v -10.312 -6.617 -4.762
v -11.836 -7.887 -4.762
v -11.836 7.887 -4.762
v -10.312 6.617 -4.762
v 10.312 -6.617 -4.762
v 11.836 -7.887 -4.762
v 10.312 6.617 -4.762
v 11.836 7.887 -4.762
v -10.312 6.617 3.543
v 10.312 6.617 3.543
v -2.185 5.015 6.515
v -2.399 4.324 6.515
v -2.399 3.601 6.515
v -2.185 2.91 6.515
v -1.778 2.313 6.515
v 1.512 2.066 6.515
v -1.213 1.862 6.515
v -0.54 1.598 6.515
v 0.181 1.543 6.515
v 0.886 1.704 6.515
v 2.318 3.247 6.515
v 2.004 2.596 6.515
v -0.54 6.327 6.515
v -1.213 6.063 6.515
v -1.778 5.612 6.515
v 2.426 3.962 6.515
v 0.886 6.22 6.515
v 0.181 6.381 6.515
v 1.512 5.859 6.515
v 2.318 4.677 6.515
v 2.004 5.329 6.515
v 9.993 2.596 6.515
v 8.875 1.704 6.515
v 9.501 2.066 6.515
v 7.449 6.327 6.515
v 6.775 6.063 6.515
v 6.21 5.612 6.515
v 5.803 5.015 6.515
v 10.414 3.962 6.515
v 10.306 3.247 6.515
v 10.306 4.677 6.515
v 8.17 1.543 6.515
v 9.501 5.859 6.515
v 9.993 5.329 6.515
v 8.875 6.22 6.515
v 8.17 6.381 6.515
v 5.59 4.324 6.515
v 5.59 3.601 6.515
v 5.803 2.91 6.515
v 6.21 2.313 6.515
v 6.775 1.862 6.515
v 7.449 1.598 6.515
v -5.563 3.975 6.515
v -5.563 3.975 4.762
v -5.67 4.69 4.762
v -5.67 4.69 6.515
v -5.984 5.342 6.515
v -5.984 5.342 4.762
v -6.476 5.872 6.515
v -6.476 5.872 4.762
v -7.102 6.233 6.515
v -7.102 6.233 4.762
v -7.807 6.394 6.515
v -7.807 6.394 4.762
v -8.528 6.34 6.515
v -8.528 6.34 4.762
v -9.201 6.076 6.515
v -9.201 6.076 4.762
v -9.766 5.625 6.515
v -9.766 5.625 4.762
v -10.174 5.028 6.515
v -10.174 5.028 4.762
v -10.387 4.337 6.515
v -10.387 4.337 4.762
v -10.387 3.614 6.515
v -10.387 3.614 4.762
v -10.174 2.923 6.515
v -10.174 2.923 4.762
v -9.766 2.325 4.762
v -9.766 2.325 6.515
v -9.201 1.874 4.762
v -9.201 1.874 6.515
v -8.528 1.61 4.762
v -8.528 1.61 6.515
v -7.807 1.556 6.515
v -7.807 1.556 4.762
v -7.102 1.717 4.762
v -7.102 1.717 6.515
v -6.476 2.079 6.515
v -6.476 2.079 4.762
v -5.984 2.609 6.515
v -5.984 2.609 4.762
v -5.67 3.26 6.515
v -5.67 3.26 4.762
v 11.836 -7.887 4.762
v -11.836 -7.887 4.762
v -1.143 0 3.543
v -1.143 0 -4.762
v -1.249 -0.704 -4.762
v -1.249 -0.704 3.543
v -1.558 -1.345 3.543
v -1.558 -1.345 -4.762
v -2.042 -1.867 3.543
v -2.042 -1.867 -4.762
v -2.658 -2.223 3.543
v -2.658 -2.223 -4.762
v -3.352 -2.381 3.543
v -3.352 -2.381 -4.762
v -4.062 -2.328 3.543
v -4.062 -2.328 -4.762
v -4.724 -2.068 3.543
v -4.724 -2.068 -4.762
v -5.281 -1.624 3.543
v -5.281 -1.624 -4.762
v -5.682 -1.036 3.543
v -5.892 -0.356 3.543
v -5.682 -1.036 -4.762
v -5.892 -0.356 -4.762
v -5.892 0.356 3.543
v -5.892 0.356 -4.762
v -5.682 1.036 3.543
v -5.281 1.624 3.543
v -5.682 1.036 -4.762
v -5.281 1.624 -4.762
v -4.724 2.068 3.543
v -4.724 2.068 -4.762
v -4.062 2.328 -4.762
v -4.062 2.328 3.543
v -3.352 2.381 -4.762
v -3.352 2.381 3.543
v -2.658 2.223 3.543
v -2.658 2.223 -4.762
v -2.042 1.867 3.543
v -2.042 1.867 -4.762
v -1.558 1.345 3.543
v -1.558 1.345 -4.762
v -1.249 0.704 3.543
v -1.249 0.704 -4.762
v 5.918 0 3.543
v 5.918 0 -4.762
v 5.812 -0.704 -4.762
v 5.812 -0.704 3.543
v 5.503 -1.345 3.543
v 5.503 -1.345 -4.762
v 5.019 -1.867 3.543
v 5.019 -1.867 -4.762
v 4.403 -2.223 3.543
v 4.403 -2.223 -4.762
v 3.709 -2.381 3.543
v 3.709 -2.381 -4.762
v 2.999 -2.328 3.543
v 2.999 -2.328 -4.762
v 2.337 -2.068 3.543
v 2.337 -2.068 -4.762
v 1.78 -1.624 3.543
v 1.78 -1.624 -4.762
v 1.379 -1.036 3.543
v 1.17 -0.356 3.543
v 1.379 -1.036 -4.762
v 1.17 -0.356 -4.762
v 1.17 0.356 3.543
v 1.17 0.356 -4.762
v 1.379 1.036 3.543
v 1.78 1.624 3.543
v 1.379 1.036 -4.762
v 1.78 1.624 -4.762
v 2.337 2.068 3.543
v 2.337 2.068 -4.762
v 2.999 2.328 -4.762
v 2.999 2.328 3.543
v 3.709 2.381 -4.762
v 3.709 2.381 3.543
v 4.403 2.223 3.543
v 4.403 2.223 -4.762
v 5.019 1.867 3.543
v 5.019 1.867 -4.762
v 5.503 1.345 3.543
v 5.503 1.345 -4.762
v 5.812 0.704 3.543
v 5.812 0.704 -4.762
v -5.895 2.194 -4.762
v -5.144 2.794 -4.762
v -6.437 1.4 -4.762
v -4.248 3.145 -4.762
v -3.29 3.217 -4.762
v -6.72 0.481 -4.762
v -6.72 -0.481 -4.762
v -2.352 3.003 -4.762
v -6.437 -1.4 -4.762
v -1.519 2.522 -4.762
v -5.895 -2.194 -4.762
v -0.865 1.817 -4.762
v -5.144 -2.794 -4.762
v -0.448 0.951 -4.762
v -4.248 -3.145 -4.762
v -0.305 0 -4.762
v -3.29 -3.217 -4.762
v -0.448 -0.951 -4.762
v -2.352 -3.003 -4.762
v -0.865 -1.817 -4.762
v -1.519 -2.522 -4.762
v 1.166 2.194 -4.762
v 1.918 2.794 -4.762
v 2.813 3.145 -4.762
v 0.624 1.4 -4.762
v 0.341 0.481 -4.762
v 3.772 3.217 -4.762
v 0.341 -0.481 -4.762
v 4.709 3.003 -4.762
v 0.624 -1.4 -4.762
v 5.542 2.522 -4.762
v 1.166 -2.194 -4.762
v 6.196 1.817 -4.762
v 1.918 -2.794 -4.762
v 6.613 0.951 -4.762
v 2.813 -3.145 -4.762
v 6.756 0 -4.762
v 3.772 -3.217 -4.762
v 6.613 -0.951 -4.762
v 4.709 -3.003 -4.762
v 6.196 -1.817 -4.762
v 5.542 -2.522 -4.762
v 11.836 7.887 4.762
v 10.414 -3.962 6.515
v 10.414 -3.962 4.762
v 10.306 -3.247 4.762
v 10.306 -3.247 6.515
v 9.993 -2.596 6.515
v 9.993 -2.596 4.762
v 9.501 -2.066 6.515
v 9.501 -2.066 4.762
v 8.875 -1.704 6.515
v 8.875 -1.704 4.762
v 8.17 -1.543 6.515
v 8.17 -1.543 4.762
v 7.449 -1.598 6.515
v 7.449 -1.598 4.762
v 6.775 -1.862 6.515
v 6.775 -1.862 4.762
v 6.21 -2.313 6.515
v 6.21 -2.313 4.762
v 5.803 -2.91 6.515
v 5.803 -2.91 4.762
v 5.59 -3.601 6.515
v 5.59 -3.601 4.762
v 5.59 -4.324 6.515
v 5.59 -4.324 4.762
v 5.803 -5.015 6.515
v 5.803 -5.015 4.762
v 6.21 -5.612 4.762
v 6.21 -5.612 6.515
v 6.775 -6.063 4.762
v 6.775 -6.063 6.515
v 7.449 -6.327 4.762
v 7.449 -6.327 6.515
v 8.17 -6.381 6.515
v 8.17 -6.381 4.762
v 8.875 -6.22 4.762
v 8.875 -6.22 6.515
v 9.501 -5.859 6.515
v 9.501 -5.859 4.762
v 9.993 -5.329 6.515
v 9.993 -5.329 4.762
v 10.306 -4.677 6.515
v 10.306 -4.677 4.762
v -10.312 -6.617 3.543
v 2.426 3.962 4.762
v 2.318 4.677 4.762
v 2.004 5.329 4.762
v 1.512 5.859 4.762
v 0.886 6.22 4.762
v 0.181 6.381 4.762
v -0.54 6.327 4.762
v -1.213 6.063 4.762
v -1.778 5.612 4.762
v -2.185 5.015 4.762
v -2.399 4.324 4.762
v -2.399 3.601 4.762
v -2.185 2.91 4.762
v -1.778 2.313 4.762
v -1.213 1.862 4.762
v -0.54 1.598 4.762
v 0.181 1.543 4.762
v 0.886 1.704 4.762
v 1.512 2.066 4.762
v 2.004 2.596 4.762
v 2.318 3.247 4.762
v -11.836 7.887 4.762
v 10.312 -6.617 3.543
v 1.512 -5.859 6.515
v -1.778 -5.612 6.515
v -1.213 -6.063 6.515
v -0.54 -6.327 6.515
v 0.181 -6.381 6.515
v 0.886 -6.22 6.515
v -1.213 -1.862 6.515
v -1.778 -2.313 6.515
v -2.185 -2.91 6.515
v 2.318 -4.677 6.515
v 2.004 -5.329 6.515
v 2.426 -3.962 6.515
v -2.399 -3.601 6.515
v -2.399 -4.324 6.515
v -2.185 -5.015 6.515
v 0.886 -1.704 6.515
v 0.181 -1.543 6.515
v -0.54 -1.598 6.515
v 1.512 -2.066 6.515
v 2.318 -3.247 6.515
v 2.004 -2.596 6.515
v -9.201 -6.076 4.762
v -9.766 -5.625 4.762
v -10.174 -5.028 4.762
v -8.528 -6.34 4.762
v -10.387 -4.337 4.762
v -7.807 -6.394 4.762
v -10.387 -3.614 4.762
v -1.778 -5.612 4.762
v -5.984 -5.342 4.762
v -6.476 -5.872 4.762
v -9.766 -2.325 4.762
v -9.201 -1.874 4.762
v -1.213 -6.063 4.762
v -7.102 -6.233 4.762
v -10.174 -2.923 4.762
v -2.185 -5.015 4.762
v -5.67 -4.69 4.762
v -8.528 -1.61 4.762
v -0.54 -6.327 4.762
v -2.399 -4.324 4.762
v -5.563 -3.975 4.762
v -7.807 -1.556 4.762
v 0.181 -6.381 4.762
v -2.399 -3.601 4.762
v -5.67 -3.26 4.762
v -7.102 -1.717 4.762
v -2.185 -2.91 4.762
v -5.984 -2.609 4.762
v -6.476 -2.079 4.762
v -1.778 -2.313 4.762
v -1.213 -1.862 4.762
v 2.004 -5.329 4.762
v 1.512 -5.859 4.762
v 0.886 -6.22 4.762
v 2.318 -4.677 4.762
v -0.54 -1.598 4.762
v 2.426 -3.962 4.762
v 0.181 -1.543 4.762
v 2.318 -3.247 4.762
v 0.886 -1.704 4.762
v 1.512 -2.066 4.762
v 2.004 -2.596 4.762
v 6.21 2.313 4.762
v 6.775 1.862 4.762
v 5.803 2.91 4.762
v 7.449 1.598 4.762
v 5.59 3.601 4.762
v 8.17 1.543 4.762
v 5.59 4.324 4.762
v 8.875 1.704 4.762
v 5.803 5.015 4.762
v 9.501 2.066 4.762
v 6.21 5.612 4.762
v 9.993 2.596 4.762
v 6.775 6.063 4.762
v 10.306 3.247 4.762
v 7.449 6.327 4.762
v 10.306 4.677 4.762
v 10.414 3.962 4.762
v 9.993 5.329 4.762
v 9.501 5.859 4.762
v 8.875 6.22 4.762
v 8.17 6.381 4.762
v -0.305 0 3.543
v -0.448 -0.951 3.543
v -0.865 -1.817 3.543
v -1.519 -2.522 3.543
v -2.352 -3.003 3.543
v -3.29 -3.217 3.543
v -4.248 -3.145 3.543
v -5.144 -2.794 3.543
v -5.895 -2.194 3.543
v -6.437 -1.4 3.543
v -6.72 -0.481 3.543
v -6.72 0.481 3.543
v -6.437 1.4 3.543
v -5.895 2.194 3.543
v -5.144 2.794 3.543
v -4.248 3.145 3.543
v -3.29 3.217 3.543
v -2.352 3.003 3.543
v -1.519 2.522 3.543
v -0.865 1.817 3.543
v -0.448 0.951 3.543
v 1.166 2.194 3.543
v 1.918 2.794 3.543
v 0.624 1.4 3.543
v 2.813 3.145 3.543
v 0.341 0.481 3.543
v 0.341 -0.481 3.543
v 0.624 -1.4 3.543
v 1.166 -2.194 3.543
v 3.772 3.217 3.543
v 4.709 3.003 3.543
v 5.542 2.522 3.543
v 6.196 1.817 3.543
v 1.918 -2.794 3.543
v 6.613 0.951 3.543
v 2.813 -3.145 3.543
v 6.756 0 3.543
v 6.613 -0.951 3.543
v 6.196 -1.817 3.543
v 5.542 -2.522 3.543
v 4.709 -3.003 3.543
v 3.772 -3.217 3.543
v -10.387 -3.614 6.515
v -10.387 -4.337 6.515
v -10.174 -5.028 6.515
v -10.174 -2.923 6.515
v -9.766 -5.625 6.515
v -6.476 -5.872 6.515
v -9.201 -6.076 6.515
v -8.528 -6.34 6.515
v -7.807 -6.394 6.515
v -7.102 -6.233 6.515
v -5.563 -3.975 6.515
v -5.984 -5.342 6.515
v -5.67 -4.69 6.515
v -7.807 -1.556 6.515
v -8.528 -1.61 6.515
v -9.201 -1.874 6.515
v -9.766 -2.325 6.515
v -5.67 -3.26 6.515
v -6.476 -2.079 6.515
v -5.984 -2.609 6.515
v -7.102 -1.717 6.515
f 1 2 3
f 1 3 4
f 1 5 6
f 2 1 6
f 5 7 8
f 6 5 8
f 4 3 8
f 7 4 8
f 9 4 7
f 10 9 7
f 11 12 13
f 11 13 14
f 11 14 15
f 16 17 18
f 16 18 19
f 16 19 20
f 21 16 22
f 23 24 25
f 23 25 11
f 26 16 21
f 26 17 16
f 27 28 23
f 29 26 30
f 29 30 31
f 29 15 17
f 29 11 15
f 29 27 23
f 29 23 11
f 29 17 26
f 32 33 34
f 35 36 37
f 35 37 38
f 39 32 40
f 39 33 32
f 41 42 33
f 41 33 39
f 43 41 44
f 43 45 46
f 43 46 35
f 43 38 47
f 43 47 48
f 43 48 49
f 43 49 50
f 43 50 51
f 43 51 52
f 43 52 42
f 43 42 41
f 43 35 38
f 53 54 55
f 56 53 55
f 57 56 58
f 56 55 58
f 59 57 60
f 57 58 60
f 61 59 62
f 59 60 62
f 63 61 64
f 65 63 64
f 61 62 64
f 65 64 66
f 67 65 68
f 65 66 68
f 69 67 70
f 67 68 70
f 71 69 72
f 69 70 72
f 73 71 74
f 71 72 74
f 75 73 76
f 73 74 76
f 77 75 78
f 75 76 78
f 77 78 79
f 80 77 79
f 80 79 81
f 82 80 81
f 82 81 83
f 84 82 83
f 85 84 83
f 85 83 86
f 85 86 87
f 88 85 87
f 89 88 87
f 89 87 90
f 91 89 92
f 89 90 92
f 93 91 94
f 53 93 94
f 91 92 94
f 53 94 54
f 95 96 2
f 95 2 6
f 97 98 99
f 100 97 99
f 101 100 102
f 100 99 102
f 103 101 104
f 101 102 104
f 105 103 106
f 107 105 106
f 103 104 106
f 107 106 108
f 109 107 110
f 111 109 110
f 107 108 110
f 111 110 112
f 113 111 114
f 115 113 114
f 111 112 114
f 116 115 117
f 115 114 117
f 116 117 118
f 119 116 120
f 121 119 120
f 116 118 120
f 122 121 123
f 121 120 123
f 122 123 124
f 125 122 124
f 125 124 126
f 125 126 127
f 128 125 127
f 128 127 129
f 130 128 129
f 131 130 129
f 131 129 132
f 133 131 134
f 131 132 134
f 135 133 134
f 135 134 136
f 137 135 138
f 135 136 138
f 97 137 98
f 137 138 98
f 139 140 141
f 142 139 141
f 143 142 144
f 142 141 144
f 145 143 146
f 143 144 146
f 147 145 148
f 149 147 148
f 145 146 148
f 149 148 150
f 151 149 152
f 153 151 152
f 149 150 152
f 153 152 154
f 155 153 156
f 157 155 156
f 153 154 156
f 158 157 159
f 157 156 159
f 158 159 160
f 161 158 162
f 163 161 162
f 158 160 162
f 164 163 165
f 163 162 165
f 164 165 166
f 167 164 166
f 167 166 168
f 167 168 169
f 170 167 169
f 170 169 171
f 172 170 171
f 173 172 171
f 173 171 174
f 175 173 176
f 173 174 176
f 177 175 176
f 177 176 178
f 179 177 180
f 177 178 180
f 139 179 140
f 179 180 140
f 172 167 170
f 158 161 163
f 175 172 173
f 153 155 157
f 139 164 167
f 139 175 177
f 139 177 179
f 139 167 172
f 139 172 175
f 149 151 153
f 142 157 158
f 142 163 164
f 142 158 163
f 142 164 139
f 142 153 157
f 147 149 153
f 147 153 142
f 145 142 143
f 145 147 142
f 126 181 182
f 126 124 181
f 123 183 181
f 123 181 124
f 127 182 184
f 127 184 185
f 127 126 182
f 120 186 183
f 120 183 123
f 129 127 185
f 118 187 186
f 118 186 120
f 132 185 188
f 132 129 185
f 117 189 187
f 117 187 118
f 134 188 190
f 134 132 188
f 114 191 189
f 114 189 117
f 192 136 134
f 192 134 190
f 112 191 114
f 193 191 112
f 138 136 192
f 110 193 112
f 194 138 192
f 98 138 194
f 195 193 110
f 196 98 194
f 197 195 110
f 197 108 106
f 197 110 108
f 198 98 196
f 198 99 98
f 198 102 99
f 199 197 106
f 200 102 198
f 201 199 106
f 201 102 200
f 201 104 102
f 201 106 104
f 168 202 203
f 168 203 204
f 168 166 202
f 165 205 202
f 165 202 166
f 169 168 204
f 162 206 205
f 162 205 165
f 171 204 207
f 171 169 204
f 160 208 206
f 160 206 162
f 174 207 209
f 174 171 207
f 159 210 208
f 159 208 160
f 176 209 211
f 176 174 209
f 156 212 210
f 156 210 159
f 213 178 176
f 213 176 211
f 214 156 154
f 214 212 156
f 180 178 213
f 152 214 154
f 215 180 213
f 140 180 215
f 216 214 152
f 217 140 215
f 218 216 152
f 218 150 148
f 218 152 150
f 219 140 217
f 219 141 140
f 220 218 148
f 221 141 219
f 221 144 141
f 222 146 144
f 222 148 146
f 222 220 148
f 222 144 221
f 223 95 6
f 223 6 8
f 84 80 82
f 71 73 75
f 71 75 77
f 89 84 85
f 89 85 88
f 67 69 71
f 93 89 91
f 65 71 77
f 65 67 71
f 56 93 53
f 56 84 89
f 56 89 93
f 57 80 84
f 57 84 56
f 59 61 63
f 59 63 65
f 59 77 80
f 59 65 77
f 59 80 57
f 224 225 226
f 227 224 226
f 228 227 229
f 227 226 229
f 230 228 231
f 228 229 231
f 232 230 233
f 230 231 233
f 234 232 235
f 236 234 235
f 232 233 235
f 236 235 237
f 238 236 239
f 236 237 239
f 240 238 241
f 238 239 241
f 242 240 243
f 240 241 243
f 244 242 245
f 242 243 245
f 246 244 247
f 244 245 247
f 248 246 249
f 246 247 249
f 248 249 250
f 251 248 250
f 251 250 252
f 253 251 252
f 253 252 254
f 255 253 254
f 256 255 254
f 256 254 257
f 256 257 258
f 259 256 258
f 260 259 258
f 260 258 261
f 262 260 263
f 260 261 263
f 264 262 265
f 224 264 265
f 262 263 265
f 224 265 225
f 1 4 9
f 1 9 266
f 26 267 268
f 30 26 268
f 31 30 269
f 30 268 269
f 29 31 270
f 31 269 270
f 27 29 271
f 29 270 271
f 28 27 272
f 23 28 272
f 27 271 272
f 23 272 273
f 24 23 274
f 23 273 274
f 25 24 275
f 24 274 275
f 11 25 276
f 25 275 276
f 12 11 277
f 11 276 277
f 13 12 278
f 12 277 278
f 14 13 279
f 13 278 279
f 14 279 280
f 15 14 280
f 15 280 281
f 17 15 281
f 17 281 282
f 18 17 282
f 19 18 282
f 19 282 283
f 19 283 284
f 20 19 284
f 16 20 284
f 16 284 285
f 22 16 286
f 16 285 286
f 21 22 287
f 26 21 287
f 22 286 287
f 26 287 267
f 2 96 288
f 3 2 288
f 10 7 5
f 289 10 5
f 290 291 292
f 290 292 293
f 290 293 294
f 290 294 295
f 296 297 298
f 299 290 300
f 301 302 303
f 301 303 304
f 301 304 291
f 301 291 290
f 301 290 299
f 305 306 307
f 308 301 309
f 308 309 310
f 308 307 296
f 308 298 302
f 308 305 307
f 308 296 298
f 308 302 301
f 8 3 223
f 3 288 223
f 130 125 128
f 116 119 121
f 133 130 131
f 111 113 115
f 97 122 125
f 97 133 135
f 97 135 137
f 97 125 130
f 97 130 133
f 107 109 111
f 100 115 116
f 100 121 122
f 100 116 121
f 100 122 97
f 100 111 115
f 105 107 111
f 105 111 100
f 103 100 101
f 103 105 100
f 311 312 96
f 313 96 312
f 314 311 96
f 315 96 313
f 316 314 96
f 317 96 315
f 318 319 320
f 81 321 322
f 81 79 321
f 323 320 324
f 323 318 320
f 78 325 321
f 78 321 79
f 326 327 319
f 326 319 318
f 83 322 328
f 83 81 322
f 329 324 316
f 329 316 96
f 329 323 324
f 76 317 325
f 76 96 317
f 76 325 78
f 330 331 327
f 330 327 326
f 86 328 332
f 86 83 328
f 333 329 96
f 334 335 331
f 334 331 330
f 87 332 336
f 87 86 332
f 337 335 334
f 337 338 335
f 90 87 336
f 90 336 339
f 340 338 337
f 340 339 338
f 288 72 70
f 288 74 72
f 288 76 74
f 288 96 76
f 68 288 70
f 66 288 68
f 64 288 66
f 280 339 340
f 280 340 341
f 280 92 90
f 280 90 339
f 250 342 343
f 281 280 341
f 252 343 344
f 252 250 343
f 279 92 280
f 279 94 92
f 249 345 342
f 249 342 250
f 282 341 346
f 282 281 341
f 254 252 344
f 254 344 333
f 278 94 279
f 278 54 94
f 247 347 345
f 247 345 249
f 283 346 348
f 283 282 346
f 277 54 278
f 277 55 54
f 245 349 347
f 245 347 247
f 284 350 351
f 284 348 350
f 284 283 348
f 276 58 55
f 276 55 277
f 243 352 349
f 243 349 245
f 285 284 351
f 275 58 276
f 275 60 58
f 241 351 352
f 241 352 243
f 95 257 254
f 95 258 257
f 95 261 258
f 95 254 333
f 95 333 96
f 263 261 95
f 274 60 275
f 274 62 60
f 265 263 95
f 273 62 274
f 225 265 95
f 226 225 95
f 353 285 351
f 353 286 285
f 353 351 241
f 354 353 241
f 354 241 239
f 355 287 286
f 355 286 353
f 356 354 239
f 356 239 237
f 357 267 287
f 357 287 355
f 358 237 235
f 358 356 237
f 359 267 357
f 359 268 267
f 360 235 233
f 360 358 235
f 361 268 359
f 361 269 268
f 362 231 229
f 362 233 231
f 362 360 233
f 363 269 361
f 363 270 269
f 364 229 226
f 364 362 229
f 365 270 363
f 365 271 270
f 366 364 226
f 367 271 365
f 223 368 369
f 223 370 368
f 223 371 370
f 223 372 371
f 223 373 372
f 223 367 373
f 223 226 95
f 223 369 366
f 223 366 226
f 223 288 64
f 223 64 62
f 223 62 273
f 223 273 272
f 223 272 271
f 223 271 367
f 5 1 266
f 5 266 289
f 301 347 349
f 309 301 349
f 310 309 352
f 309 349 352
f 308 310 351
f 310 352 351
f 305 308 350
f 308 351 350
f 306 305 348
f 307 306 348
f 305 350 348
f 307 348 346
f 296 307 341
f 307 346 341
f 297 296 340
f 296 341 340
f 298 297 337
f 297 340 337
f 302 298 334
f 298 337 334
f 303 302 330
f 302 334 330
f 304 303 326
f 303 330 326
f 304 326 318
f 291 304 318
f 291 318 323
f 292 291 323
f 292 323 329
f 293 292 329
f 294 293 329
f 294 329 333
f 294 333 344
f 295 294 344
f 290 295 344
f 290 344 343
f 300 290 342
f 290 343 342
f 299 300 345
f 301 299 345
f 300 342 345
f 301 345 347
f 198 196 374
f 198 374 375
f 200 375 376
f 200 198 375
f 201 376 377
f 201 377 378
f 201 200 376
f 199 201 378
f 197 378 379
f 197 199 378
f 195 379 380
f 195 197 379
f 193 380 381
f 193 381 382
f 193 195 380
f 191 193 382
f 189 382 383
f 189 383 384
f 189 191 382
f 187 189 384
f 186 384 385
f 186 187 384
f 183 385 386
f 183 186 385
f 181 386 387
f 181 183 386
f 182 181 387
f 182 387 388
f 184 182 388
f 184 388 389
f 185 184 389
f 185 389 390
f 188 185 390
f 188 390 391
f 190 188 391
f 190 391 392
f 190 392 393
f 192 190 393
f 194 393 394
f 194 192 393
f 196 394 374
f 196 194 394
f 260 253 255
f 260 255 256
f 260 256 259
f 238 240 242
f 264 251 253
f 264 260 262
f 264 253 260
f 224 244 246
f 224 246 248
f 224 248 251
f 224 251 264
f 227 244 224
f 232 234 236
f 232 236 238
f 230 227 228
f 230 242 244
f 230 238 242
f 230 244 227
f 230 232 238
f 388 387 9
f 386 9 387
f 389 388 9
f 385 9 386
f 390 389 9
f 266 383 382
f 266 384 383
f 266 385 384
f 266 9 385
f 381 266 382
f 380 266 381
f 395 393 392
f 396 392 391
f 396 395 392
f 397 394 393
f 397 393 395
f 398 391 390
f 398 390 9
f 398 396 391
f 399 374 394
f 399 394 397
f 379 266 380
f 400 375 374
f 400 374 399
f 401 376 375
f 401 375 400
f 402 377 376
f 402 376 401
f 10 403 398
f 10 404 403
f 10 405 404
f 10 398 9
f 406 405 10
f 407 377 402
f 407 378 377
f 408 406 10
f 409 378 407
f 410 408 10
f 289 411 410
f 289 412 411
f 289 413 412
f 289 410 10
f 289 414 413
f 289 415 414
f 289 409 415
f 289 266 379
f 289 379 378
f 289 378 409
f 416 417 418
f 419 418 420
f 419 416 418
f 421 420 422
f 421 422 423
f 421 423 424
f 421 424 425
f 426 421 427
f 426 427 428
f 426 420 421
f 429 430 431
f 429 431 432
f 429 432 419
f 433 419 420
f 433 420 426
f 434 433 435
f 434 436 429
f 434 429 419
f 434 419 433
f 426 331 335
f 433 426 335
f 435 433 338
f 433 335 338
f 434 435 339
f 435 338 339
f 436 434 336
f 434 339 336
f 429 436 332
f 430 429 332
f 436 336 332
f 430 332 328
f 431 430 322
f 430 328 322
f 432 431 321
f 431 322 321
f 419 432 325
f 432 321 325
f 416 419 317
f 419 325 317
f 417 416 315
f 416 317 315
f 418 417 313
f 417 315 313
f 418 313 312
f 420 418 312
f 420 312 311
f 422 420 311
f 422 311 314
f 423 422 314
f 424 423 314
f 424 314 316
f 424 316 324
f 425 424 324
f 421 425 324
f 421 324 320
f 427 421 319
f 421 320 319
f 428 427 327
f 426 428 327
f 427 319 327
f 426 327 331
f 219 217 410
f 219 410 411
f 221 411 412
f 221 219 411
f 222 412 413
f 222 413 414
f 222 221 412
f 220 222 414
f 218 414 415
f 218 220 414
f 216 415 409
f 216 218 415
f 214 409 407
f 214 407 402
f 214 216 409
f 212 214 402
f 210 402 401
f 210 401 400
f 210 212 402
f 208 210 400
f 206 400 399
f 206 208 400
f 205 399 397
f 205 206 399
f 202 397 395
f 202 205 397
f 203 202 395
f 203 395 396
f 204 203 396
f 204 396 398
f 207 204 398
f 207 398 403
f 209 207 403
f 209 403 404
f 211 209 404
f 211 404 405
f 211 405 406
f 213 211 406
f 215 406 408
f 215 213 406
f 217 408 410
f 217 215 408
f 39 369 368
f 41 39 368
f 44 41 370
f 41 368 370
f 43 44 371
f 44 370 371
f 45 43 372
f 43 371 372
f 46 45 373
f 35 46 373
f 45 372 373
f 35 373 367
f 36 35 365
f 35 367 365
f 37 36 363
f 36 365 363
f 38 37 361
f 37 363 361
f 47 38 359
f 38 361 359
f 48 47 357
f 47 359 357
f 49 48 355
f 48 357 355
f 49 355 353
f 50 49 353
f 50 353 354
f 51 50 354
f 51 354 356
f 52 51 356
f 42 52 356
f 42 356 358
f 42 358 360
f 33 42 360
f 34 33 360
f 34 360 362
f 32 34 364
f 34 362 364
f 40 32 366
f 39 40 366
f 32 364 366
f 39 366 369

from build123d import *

# Parameters (mm, degrees)
F0_W     = 23.6728
F0_H     = 15.7734
F1_DEPTH = 4.7625
F2_R     = 2.4257
F3_DEPTH = 1.7526
F4_W     = 20.6248
F4_H     = 13.2334
F7_DEPTH = 8.3058
F5_R     = 3.2258
F8_DEPTH = 8.3058
F6_R     = 2.3876
F9_DEPTH = 8.3058


with BuildPart() as f1:
    # F0 (on Top) → F1 (new body, symmetric)
    with BuildSketch(Plane.XY):
        Rectangle(F0_W, F0_H)
    extrude(amount=F1_DEPTH, both=True)

    # F2 (on face) → F3 (join)
    with BuildSketch(Plane.XY.offset(4.7625)):
        with Locations((-7.9883, 3.9751)):
            Circle(F2_R)
        with Locations((0, 3.9624)):
            Circle(F2_R)
        with Locations((7.9883, 3.9624)):
            Circle(F2_R)
        with Locations((7.9883, -3.9624)):
            Circle(F2_R)
        with Locations((0, -3.9624)):
            Circle(F2_R)
        with Locations((-7.9883, -3.9751)):
            Circle(F2_R)
    extrude(amount=F3_DEPTH)

    # F4 (on face) → F7 (cut)
    with BuildSketch(Plane(origin=(0, 0, -4.7625), x_dir=(1, 0, 0), z_dir=(0, 0, -1))):
        Rectangle(F4_W, F4_H)
    extrude(amount=-F7_DEPTH, mode=Mode.SUBTRACT)

    # F5 (on face) → F8 (join)
    with BuildSketch(Plane(origin=(0, 0, -4.7625), x_dir=(1, 0, 0), z_dir=(0, 0, -1))):
        with Locations((-3.5306, 0)):
            Circle(F5_R)
        with Locations((3.5306, 0)):
            Circle(F5_R)
    extrude(amount=-F8_DEPTH)

    # F6 (on face) → F9 (cut)
    with BuildSketch(Plane(origin=(0, 0, -4.7625), x_dir=(1, 0, 0), z_dir=(0, 0, -1))):
        with Locations((-3.5306, 0)):
            Circle(F6_R)
        with Locations((3.5306, 0)):
            Circle(F6_R)
    extrude(amount=-F9_DEPTH, mode=Mode.SUBTRACT)


solid = f1.part
